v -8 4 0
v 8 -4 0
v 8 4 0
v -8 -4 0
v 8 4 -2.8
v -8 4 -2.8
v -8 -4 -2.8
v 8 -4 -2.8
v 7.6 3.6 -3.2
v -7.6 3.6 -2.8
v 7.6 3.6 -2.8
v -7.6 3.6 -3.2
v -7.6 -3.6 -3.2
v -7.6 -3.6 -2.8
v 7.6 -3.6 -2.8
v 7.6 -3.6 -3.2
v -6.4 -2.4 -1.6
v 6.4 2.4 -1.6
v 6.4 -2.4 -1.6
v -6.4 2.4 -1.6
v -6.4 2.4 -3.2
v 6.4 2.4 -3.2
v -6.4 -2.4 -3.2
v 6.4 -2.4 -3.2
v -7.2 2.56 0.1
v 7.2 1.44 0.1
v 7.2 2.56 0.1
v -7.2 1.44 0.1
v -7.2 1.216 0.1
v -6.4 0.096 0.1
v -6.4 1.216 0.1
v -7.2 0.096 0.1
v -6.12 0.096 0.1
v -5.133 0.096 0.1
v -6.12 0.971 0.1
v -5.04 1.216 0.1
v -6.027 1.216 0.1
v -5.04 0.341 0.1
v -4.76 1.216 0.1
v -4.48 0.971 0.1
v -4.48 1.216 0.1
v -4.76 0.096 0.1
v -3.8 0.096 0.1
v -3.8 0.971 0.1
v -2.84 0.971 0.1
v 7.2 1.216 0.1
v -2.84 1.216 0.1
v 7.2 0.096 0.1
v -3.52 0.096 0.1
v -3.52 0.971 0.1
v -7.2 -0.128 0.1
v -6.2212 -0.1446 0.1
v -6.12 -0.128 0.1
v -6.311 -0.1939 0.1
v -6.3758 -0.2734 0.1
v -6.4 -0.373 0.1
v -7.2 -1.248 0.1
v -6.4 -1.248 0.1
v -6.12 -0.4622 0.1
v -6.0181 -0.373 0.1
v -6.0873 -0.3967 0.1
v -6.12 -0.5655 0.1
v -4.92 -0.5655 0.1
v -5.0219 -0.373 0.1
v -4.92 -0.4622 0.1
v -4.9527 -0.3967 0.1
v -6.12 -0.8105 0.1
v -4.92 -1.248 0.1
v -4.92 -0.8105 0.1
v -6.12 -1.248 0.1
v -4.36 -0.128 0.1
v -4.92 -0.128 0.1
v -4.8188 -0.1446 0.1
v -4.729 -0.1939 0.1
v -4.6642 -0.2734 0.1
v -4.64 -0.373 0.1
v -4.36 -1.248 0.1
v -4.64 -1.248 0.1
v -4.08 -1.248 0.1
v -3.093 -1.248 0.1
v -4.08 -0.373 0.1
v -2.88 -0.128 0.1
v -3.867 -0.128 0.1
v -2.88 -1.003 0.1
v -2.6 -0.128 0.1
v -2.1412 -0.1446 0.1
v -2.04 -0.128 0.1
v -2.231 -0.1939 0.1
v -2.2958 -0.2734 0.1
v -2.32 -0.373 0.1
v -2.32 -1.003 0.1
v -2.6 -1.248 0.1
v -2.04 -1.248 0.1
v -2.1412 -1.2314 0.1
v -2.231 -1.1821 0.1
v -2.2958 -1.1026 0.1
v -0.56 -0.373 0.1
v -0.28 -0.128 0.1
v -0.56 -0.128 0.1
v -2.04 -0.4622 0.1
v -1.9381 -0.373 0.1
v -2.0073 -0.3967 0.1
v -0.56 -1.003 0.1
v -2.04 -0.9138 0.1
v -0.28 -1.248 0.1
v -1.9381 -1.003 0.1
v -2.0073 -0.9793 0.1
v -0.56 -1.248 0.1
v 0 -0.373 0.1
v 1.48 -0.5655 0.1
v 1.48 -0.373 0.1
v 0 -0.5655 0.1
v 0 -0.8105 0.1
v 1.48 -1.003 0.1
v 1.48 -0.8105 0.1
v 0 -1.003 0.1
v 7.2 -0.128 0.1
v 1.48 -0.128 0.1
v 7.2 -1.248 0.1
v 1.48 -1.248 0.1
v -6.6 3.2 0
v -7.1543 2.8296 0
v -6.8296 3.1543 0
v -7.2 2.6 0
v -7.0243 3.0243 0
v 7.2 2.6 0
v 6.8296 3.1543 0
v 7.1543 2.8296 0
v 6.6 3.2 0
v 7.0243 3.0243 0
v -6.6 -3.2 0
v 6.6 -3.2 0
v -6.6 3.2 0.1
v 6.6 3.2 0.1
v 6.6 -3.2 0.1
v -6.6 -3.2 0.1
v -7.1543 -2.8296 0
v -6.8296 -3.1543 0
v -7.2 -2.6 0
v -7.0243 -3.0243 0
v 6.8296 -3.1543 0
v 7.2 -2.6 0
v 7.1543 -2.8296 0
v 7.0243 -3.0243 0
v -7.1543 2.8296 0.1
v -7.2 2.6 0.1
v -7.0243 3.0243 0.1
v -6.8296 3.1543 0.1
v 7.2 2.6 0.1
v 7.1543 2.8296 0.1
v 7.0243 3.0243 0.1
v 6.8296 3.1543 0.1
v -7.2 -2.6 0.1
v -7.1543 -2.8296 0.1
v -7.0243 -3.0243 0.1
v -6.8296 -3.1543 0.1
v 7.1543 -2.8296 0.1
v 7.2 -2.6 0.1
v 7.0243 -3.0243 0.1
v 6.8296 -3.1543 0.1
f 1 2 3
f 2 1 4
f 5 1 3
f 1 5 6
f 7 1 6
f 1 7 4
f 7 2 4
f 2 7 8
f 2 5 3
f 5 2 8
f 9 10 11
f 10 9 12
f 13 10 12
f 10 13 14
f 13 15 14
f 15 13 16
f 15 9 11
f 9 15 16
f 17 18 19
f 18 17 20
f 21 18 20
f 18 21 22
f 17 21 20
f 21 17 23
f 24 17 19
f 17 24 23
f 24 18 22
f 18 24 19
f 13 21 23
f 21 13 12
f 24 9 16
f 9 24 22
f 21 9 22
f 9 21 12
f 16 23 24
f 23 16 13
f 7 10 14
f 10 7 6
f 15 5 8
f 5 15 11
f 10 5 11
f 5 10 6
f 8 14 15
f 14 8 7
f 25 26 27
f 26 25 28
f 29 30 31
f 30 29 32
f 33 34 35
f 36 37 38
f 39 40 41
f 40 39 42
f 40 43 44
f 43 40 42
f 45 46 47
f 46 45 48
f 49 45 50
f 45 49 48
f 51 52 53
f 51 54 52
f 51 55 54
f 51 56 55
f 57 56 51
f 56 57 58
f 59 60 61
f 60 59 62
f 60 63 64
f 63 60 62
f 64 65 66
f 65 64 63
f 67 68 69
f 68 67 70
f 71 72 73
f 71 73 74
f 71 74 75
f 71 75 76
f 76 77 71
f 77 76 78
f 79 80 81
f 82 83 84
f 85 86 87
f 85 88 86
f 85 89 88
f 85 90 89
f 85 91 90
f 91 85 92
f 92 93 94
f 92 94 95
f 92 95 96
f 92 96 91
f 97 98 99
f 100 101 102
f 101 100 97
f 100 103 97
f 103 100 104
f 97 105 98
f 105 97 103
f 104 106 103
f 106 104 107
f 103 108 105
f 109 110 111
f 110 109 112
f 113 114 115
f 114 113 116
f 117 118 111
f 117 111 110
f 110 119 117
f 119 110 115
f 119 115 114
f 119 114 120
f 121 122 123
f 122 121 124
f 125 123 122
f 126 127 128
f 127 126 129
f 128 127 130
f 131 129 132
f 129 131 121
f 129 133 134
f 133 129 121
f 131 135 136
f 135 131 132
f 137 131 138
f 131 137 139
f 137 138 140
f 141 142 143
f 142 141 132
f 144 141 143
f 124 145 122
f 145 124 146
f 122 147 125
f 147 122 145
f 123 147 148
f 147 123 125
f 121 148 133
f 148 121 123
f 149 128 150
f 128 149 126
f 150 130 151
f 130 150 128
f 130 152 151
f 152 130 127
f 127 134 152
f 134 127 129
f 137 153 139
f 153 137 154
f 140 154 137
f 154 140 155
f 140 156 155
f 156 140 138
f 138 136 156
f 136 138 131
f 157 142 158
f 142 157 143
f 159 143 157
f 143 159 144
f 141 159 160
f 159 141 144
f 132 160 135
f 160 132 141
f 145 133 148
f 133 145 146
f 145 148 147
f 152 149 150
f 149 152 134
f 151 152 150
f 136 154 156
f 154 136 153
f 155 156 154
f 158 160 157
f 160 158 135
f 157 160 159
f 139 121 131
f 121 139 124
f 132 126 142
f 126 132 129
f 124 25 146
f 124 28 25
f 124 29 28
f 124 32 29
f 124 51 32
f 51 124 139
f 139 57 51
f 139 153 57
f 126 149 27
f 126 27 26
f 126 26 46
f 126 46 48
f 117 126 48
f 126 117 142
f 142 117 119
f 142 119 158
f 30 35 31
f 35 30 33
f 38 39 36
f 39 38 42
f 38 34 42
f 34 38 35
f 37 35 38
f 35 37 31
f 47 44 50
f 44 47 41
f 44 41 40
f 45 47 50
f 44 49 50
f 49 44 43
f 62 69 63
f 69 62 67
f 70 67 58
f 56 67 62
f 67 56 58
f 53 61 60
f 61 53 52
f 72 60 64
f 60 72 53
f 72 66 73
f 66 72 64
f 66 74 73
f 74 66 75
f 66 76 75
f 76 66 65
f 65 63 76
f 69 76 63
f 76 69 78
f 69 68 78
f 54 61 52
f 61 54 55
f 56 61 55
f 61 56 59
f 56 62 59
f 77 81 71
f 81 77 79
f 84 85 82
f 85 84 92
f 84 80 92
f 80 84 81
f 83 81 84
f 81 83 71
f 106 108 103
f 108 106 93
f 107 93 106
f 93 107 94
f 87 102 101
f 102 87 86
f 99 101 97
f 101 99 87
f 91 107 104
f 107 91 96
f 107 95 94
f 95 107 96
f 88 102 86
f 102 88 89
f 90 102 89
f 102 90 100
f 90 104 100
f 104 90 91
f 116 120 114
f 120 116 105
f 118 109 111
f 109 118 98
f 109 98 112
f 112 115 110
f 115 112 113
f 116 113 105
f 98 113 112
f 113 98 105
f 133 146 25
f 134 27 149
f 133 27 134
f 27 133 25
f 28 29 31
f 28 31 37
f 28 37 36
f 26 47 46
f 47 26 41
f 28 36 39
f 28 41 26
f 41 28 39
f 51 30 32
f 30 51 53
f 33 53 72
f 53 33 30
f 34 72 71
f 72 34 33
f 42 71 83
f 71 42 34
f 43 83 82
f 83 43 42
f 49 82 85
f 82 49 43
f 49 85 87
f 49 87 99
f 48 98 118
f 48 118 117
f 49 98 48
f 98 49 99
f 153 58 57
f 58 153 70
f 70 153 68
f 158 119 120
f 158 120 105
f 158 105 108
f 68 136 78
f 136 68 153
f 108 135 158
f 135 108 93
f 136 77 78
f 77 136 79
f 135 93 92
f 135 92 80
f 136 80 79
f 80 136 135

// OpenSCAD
// file: ../p/box5.scad
use <../lib.scad>
function ldraw_lib__box5() = [
// 0 Box with 5 Faces and All Edges
// 0 Name: box5.dat
// 0 Author: James Jessiman
// 0 !LDRAW_ORG Primitive UPDATE 2012-01
// 0 !LICENSE Licensed under CC BY 4.0 : see CAreadme.txt
// 
// 0 BFC CERTIFY CCW
  [0,"BFC","CERTIFY"],
  [0,"BFC","CCW"],
// 
// 0 !HISTORY 2002-04-03 [sbliss] Modified for BFC compliance
// 0 !HISTORY 2002-04-25 [PTadmin] Official Update 2002-02
// 0 !HISTORY 2007-06-24 [PTadmin] Header formatted for Contributor Agreement
// 0 !HISTORY 2008-07-01 [PTadmin] Official Update 2008-01
// 0 !HISTORY 2012-02-16 [Philo] Changed to CCW
// 0 !HISTORY 2012-03-30 [PTadmin] Official Update 2012-01
// 
// 
// 2 24 1 1 1 -1 1 1
  [2,24,1,1,1,-1,1,1],
// 2 24 -1 1 1 -1 1 -1
  [2,24,-1,1,1,-1,1,-1],
// 2 24 -1 1 -1 1 1 -1
  [2,24,-1,1,-1,1,1,-1],
// 2 24 1 1 -1 1 1 1
  [2,24,1,1,-1,1,1,1],
// 2 24 1 0 1 -1 0 1
  [2,24,1,0,1,-1,0,1],
// 2 24 -1 0 1 -1 0 -1
  [2,24,-1,0,1,-1,0,-1],
// 2 24 -1 0 -1 1 0 -1
  [2,24,-1,0,-1,1,0,-1],
// 2 24 1 0 -1 1 0 1
  [2,24,1,0,-1,1,0,1],
// 2 24 1 0 1 1 1 1
  [2,24,1,0,1,1,1,1],
// 2 24 -1 0 1 -1 1 1
  [2,24,-1,0,1,-1,1,1],
// 2 24 1 0 -1 1 1 -1
  [2,24,1,0,-1,1,1,-1],
// 2 24 -1 0 -1 -1 1 -1
  [2,24,-1,0,-1,-1,1,-1],
// 4 16 -1 1 1 1 1 1 1 1 -1 -1 1 -1
  [4,16,-1,1,1,1,1,1,1,1,-1,-1,1,-1],
// 4 16 -1 1 1 -1 0 1 1 0 1 1 1 1
  [4,16,-1,1,1,-1,0,1,1,0,1,1,1,1],
// 4 16 -1 1 -1 -1 0 -1 -1 0 1 -1 1 1
  [4,16,-1,1,-1,-1,0,-1,-1,0,1,-1,1,1],
// 4 16 1 1 -1 1 0 -1 -1 0 -1 -1 1 -1
  [4,16,1,1,-1,1,0,-1,-1,0,-1,-1,1,-1],
// 4 16 1 1 1 1 0 1 1 0 -1 1 1 -1
  [4,16,1,1,1,1,0,1,1,0,-1,1,1,-1],
];
module ldraw_lib__box5(step=0, col=false, unit=2/5, alt=false, line=0.2, solid=!$preview)
    makepoly(ldraw_lib__box5(), step=step, col=col, unit=unit, alt=alt, line=line, solid=solid);
ldraw_lib__box5(line=0.2);
// file: ../p/box4.scad
use <../lib.scad>
function ldraw_lib__box4() = [
// 0 Box with 4 Faces (2 Parallel Pairs) and All Edges
// 0 Name: box4.dat
// 0 Author: James Jessiman
// 0 !LDRAW_ORG Primitive UPDATE 2012-01
// 0 !LICENSE Licensed under CC BY 4.0 : see CAreadme.txt
// 
// 0 BFC CERTIFY CCW
  [0,"BFC","CERTIFY"],
  [0,"BFC","CCW"],
// 
// 0 !HISTORY 2002-04-03 [sbliss] Modified for BFC compliance
// 0 !HISTORY 2002-04-25 [PTadmin] Official Update 2002-02
// 0 !HISTORY 2007-06-24 [PTadmin] Header formatted for Contributor Agreement
// 0 !HISTORY 2008-07-01 [PTadmin] Official Update 2008-01
// 0 !HISTORY 2012-02-16 [Philo] Changed to CCW
// 0 !HISTORY 2012-03-30 [PTadmin] Official Update 2012-01
// 
// 
// 2 24 1 1 1 -1 1 1
  [2,24,1,1,1,-1,1,1],
// 2 24 -1 1 1 -1 1 -1
  [2,24,-1,1,1,-1,1,-1],
// 2 24 -1 1 -1 1 1 -1
  [2,24,-1,1,-1,1,1,-1],
// 2 24 1 1 -1 1 1 1
  [2,24,1,1,-1,1,1,1],
// 2 24 1 0 1 -1 0 1
  [2,24,1,0,1,-1,0,1],
// 2 24 -1 0 1 -1 0 -1
  [2,24,-1,0,1,-1,0,-1],
// 2 24 -1 0 -1 1 0 -1
  [2,24,-1,0,-1,1,0,-1],
// 2 24 1 0 -1 1 0 1
  [2,24,1,0,-1,1,0,1],
// 2 24 1 0 1 1 1 1
  [2,24,1,0,1,1,1,1],
// 2 24 -1 0 1 -1 1 1
  [2,24,-1,0,1,-1,1,1],
// 2 24 1 0 -1 1 1 -1
  [2,24,1,0,-1,1,1,-1],
// 2 24 -1 0 -1 -1 1 -1
  [2,24,-1,0,-1,-1,1,-1],
// 4 16 -1 1 1 -1 0 1 1 0 1 1 1 1
  [4,16,-1,1,1,-1,0,1,1,0,1,1,1,1],
// 4 16 -1 1 -1 -1 0 -1 -1 0 1 -1 1 1
  [4,16,-1,1,-1,-1,0,-1,-1,0,1,-1,1,1],
// 4 16 1 1 -1 1 0 -1 -1 0 -1 -1 1 -1
  [4,16,1,1,-1,1,0,-1,-1,0,-1,-1,1,-1],
// 4 16 1 1 1 1 0 1 1 0 -1 1 1 -1
  [4,16,1,1,1,1,0,1,1,0,-1,1,1,-1],
];
module ldraw_lib__box4(step=0, col=false, unit=2/5, alt=false, line=0.2, solid=!$preview)
    makepoly(ldraw_lib__box4(), step=step, col=col, unit=unit, alt=alt, line=line, solid=solid);
ldraw_lib__box4(line=0.2);
// file: s/6148328bds02.scad
use <../../lib.scad>
function ldraw_lib__s__6148328bds02() = [
// 0 ~Sticker  0.8 x  1.8 with Black "NT ANCE" on Black Halftone Stripes on White Background - Third Stripe Background
// 0 Name: s\6148328bds02.dat
// 0 Author: Massimo Maso [Sirio]
// 0 !LDRAW_ORG Subpart UPDATE 2024-08
// 0 !LICENSE Licensed under CC BY 4.0 : see CAreadme.txt
// 
// 0 BFC CERTIFY CCW
  [0,"BFC","CERTIFY"],
  [0,"BFC","CCW"],
// 
// 0 !HISTORY 2024-09-30 [OrionP] Official Update 2024-08
// 
// 
// 0 // Top faces
// 3 16 -18 0 -.32 -15.5529 0 -.3614 -15.3 0 -.32
  [3,16,-18,0,-.32,-15.5529,0,-.3614,-15.3,0,-.32],
// 3 16 -18 0 -.32 -15.7776 0 -.4847 -15.5529 0 -.3614
  [3,16,-18,0,-.32,-15.7776,0,-.4847,-15.5529,0,-.3614],
// 3 16 -18 0 -.32 -15.9395 0 -.6834 -15.7776 0 -.4847
  [3,16,-18,0,-.32,-15.9395,0,-.6834,-15.7776,0,-.4847],
// 3 16 -18 0 -.32 -16 0 -.9325 -15.9395 0 -.6834
  [3,16,-18,0,-.32,-16,0,-.9325,-15.9395,0,-.6834],
// 4 16 -18 0 -.32 -18 0 -3.12 -16 0 -3.12 -16 0 -.9325
  [4,16,-18,0,-.32,-18,0,-3.12,-16,0,-3.12,-16,0,-.9325],
// 4 16 -15.3 0 -1.4138 -15.0452 0 -.9325 -15.2182 0 -.9918 -15.3 0 -1.1555
  [4,16,-15.3,0,-1.4138,-15.0452,0,-.9325,-15.2182,0,-.9918,-15.3,0,-1.1555],
// 4 16 -15.3 0 -1.4138 -12.3 0 -1.4138 -12.5548 0 -.9325 -15.0452 0 -.9325
  [4,16,-15.3,0,-1.4138,-12.3,0,-1.4138,-12.5548,0,-.9325,-15.0452,0,-.9325],
// 4 16 -12.3 0 -1.4138 -12.3 0 -1.1555 -12.3817 0 -.9918 -12.5548 0 -.9325
  [4,16,-12.3,0,-1.4138,-12.3,0,-1.1555,-12.3817,0,-.9918,-12.5548,0,-.9325],
// 4 16 -15.3 0 -2.0263 -15.3 0 -3.12 -12.3 0 -3.12 -12.3 0 -2.0263
  [4,16,-15.3,0,-2.0263,-15.3,0,-3.12,-12.3,0,-3.12,-12.3,0,-2.0263],
// 3 16 -10.9 0 -.32 -12.3 0 -.32 -12.0471 0 -.3614
  [3,16,-10.9,0,-.32,-12.3,0,-.32,-12.0471,0,-.3614],
// 3 16 -10.9 0 -.32 -12.0471 0 -.3614 -11.8224 0 -.4847
  [3,16,-10.9,0,-.32,-12.0471,0,-.3614,-11.8224,0,-.4847],
// 3 16 -10.9 0 -.32 -11.8224 0 -.4847 -11.6605 0 -.6834
  [3,16,-10.9,0,-.32,-11.8224,0,-.4847,-11.6605,0,-.6834],
// 3 16 -10.9 0 -.32 -11.6605 0 -.6834 -11.6 0 -.9325
  [3,16,-10.9,0,-.32,-11.6605,0,-.6834,-11.6,0,-.9325],
// 4 16 -10.9 0 -.32 -11.6 0 -.9325 -11.6 0 -3.12 -10.9 0 -3.12
  [4,16,-10.9,0,-.32,-11.6,0,-.9325,-11.6,0,-3.12,-10.9,0,-3.12],
// 3 16 -10.2 0 -3.12 -7.7324 0 -3.12 -10.2 0 -.9325
  [3,16,-10.2,0,-3.12,-7.7324,0,-3.12,-10.2,0,-.9325],
// 3 16 -7.2 0 -.32 -9.6676 0 -.32 -7.2 0 -2.5075
  [3,16,-7.2,0,-.32,-9.6676,0,-.32,-7.2,0,-2.5075],
// 3 16 -6.5 0 -.32 -5.3529 0 -.3614 -5.1 0 -.32
  [3,16,-6.5,0,-.32,-5.3529,0,-.3614,-5.1,0,-.32],
// 3 16 -6.5 0 -.32 -5.5776 0 -.4847 -5.3529 0 -.3614
  [3,16,-6.5,0,-.32,-5.5776,0,-.4847,-5.3529,0,-.3614],
// 3 16 -6.5 0 -.32 -5.7395 0 -.6834 -5.5776 0 -.4847
  [3,16,-6.5,0,-.32,-5.7395,0,-.6834,-5.5776,0,-.4847],
// 3 16 -6.5 0 -.32 -5.8 0 -.9325 -5.7395 0 -.6834
  [3,16,-6.5,0,-.32,-5.8,0,-.9325,-5.7395,0,-.6834],
// 4 16 -6.5 0 -.32 -6.5 0 -3.12 -5.8 0 -2.5075 -5.8 0 -.9325
  [4,16,-6.5,0,-.32,-6.5,0,-3.12,-5.8,0,-2.5075,-5.8,0,-.9325],
// 3 16 -6.5 0 -3.12 -5.1 0 -3.12 -5.3529 0 -3.0786
  [3,16,-6.5,0,-3.12,-5.1,0,-3.12,-5.3529,0,-3.0786],
// 3 16 -6.5 0 -3.12 -5.3529 0 -3.0786 -5.5776 0 -2.9553
  [3,16,-6.5,0,-3.12,-5.3529,0,-3.0786,-5.5776,0,-2.9553],
// 3 16 -6.5 0 -3.12 -5.5776 0 -2.9553 -5.7395 0 -2.7566
  [3,16,-6.5,0,-3.12,-5.5776,0,-2.9553,-5.7395,0,-2.7566],
// 3 16 -6.5 0 -3.12 -5.7395 0 -2.7566 -5.8 0 -2.5075
  [3,16,-6.5,0,-3.12,-5.7395,0,-2.7566,-5.8,0,-2.5075],
// 3 16 -1.4 0 -.9325 -.7 0 -.32 -1.4 0 -.32
  [3,16,-1.4,0,-.9325,-.7,0,-.32,-1.4,0,-.32],
// 4 16 -1.4 0 -.9325 -4.8452 0 -.9325 -5.0182 0 -.9918 -5.1 0 -1.1555
  [4,16,-1.4,0,-.9325,-4.8452,0,-.9325,-5.0182,0,-.9918,-5.1,0,-1.1555],
// 4 16 -1.4 0 -.9325 -5.1 0 -1.1555 -5.1 0 -2.2846 -1.4 0 -2.5075
  [4,16,-1.4,0,-.9325,-5.1,0,-1.1555,-5.1,0,-2.2846,-1.4,0,-2.5075],
// 4 16 -1.4 0 -.9325 -1.4 0 -2.5075 -.7 0 -3.12 -.7 0 -.32
  [4,16,-1.4,0,-.9325,-1.4,0,-2.5075,-.7,0,-3.12,-.7,0,-.32],
// 4 16 -1.4 0 -2.5075 -5.1 0 -2.2846 -5.0182 0 -2.4482 -4.8452 0 -2.5075
  [4,16,-1.4,0,-2.5075,-5.1,0,-2.2846,-5.0182,0,-2.4482,-4.8452,0,-2.5075],
// 3 16 -1.4 0 -2.5075 -1.4 0 -3.12 -.7 0 -3.12
  [3,16,-1.4,0,-2.5075,-1.4,0,-3.12,-.7,0,-3.12],
// 4 16 0 0 -.9325 0 0 -1.4138 3.7 0 -1.4138 3.7 0 -.9325
  [4,16,0,0,-.9325,0,0,-1.4138,3.7,0,-1.4138,3.7,0,-.9325],
// 4 16 0 0 -2.0263 0 0 -2.5075 3.7 0 -2.5075 3.7 0 -2.0263
  [4,16,0,0,-2.0263,0,0,-2.5075,3.7,0,-2.5075,3.7,0,-2.0263],
// 3 16 18 0 -.32 3.7 0 -.32 3.7 0 -.9325
  [3,16,18,0,-.32,3.7,0,-.32,3.7,0,-.9325],
// 3 16 18 0 -.32 3.7 0 -.9325 3.7 0 -1.4138
  [3,16,18,0,-.32,3.7,0,-.9325,3.7,0,-1.4138],
// 4 16 18 0 -.32 3.7 0 -1.4138 3.7 0 -2.0263 18 0 -3.12
  [4,16,18,0,-.32,3.7,0,-1.4138,3.7,0,-2.0263,18,0,-3.12],
// 3 16 18 0 -3.12 3.7 0 -2.0263 3.7 0 -2.5075
  [3,16,18,0,-3.12,3.7,0,-2.0263,3.7,0,-2.5075],
// 3 16 18 0 -3.12 3.7 0 -2.5075 3.7 0 -3.12
  [3,16,18,0,-3.12,3.7,0,-2.5075,3.7,0,-3.12],
];
module ldraw_lib__s__6148328bds02(step=0, col=false, unit=2/5, alt=false, line=0.2, solid=!$preview)
    makepoly(ldraw_lib__s__6148328bds02(), step=step, col=col, unit=unit, alt=alt, line=line, solid=solid);
ldraw_lib__s__6148328bds02(line=0.2);
// file: s/6148328bds01.scad
use <../../lib.scad>
function ldraw_lib__s__6148328bds01() = [
// 0 ~Sticker  0.8 x  1.8 with Black "NT ANCE" on Black Halftone Stripes on White Background - Second Stripe Background
// 0 Name: s\6148328bds01.dat
// 0 Author: Massimo Maso [Sirio]
// 0 !LDRAW_ORG Subpart UPDATE 2024-08
// 0 !LICENSE Licensed under CC BY 4.0 : see CAreadme.txt
// 
// 0 BFC CERTIFY CCW
  [0,"BFC","CERTIFY"],
  [0,"BFC","CCW"],
// 
// 0 !HISTORY 2024-09-30 [OrionP] Official Update 2024-08
// 
// 
// 0 // Top faces
// 4 16 -18 0 3.04 -18 0 .24 -16 0 .24 -16 0 3.04
  [4,16,-18,0,3.04,-18,0,.24,-16,0,.24,-16,0,3.04],
// 3 16 -15.3 0 .24 -12.8324 0 .24 -15.3 0 2.4275
  [3,16,-15.3,0,.24,-12.8324,0,.24,-15.3,0,2.4275],
// 3 16 -12.6 0 3.04 -15.0676 0 3.04 -12.6 0 .8525
  [3,16,-12.6,0,3.04,-15.0676,0,3.04,-12.6,0,.8525],
// 4 16 -11.2 0 2.4275 -11.2 0 3.04 -11.9 0 3.04 -11.9 0 .24
  [4,16,-11.2,0,2.4275,-11.2,0,3.04,-11.9,0,3.04,-11.9,0,.24],
// 4 16 -11.2 0 2.4275 -11.9 0 .24 -9.5 0 .24 -9.5 0 2.4275
  [4,16,-11.2,0,2.4275,-11.9,0,.24,-9.5,0,.24,-9.5,0,2.4275],
// 4 16 -7.1 0 2.4275 18 0 .24 18 0 3.04 -7.1 0 3.04
  [4,16,-7.1,0,2.4275,18,0,.24,18,0,3.04,-7.1,0,3.04],
// 4 16 -7.1 0 2.4275 -8.8 0 2.4275 -8.8 0 .24 18 0 .24
  [4,16,-7.1,0,2.4275,-8.8,0,2.4275,-8.8,0,.24,18,0,.24],
];
module ldraw_lib__s__6148328bds01(step=0, col=false, unit=2/5, alt=false, line=0.2, solid=!$preview)
    makepoly(ldraw_lib__s__6148328bds01(), step=step, col=col, unit=unit, alt=alt, line=line, solid=solid);
ldraw_lib__s__6148328bds01(line=0.2);
// file: ../p/box3u12.scad
use <../lib.scad>
function ldraw_lib__box3u12() = [
// 0 Box with 3 Parallel Faces without Any Edges
// 0 Name: box3u12.dat
// 0 Author: J.C. Tchang [tchang]
// 0 !LDRAW_ORG Primitive UPDATE 2014-02
// 0 !LICENSE Licensed under CC BY 4.0 : see CAreadme.txt
// 
// 0 BFC CERTIFY CCW
  [0,"BFC","CERTIFY"],
  [0,"BFC","CCW"],
// 
// 0 !HISTORY 2014-12-23 [PTadmin] Official Update 2014-02
// 
// 
// 4 16 -1 1 1 1 1 1 1 1 -1 -1 1 -1
  [4,16,-1,1,1,1,1,1,1,1,-1,-1,1,-1],
// 4 16 -1 1 1 -1 0 1 1 0 1 1 1 1
  [4,16,-1,1,1,-1,0,1,1,0,1,1,1,1],
// 4 16 1 1 -1 1 0 -1 -1 0 -1 -1 1 -1
  [4,16,1,1,-1,1,0,-1,-1,0,-1,-1,1,-1],
];
module ldraw_lib__box3u12(step=0, col=false, unit=2/5, alt=false, line=0.2, solid=!$preview)
    makepoly(ldraw_lib__box3u12(), step=step, col=col, unit=unit, alt=alt, line=line, solid=solid);
ldraw_lib__box3u12(line=0.2);
// file: ../p/1-4cyli.scad
use <../lib.scad>
function ldraw_lib__1_4cyli() = [
// 0 Cylinder 0.25
// 0 Name: 1-4cyli.dat
// 0 Author: James Jessiman
// 0 !LDRAW_ORG Primitive UPDATE 2012-01
// 0 !LICENSE Licensed under CC BY 4.0 : see CAreadme.txt
// 
// 0 BFC CERTIFY CCW
  [0,"BFC","CERTIFY"],
  [0,"BFC","CCW"],
// 
// 0 !HISTORY 2002-03-23 [sbliss] Added BFC statement.
// 0 !HISTORY 2002-04-25 [PTadmin] Official Update 2002-02
// 0 !HISTORY 2007-06-22 [PTadmin] Header formatted for Contributor Agreement
// 0 !HISTORY 2008-07-01 [PTadmin] Official Update 2008-01
// 0 !HISTORY 2012-02-16 [Philo] Changed to CCW
// 0 !HISTORY 2012-03-30 [PTadmin] Official Update 2012-01
// 
// 
// 4 16 1 1 0 0.9239 1 0.3827 0.9239 0 0.3827 1 0 0
  [4,16,1,1,0,0.9239,1,0.3827,0.9239,0,0.3827,1,0,0],
// 5 24 1 0 0 1 1 0 0.9239 0 0.3827 1 0 -1
  [5,24,1,0,0,1,1,0,0.9239,0,0.3827,1,0,-1],
// 4 16 0.9239 1 0.3827 0.7071 1 0.7071 0.7071 0 0.7071 0.9239 0 0.3827
  [4,16,0.9239,1,0.3827,0.7071,1,0.7071,0.7071,0,0.7071,0.9239,0,0.3827],
// 5 24 0.9239 0 0.3827 0.9239 1 0.3827 0.7071 0 0.7071 1 0 0
  [5,24,0.9239,0,0.3827,0.9239,1,0.3827,0.7071,0,0.7071,1,0,0],
// 4 16 0.7071 1 0.7071 0.3827 1 0.9239 0.3827 0 0.9239 0.7071 0 0.7071
  [4,16,0.7071,1,0.7071,0.3827,1,0.9239,0.3827,0,0.9239,0.7071,0,0.7071],
// 5 24 0.7071 0 0.7071 0.7071 1 0.7071 0.3827 0 0.9239 0.9239 0 0.3827
  [5,24,0.7071,0,0.7071,0.7071,1,0.7071,0.3827,0,0.9239,0.9239,0,0.3827],
// 4 16 0.3827 1 0.9239 0 1 1 0 0 1 0.3827 0 0.9239
  [4,16,0.3827,1,0.9239,0,1,1,0,0,1,0.3827,0,0.9239],
// 5 24 0.3827 0 0.9239 0.3827 1 0.9239 0 0 1 0.7071 0 0.7071
  [5,24,0.3827,0,0.9239,0.3827,1,0.9239,0,0,1,0.7071,0,0.7071],
// 5 24 0 0 1 0 1 1 0.3827 0 0.9239 -1 0 1
  [5,24,0,0,1,0,1,1,0.3827,0,0.9239,-1,0,1],
];
module ldraw_lib__1_4cyli(step=0, col=false, unit=2/5, alt=false, line=0.2, solid=!$preview)
    makepoly(ldraw_lib__1_4cyli(), step=step, col=col, unit=unit, alt=alt, line=line, solid=solid);
ldraw_lib__1_4cyli(line=0.2);
// file: ../p/1-4chrd.scad
use <../lib.scad>
function ldraw_lib__1_4chrd() = [
// 0 Chord 0.25
// 0 Name: 1-4chrd.dat
// 0 Author: Max Martin Richter [MMR1988]
// 0 !LDRAW_ORG Primitive UPDATE 2023-05
// 0 !LICENSE Licensed under CC BY 4.0 : see CAreadme.txt
// 
// 0 BFC CERTIFY CCW
  [0,"BFC","CERTIFY"],
  [0,"BFC","CCW"],
// 
// 0 !HISTORY 2004-04-22 [PTadmin] Official Update 2004-02
// 0 !HISTORY 2007-10-09 [PTadmin] Header formatted for Contributor Agreement
// 0 !HISTORY 2008-07-01 [PTadmin] Official Update 2008-01
// 0 !HISTORY 2012-08-02 [MMR1988] Re-creation with PrimGen2 and Rectifier
// 0 !HISTORY 2012-08-09 [PTadmin] Official Update 2012-02
// 0 !HISTORY 2023-10-27 [OrionP] Change author to MMR1988 from hafhead
// 0 !HISTORY 2023-10-31 [OrionP] Official Update 2023-05
// 
// 4 16 0.9239 0 0.3827 0.3827 0 0.9239 0 0 1 1 0 0
  [4,16,0.9239,0,0.3827,0.3827,0,0.9239,0,0,1,1,0,0],
// 3 16 0.7071 0 0.7071 0.3827 0 0.9239 0.9239 0 0.3827
  [3,16,0.7071,0,0.7071,0.3827,0,0.9239,0.9239,0,0.3827],
];
module ldraw_lib__1_4chrd(step=0, col=false, unit=2/5, alt=false, line=0.2, solid=!$preview)
    makepoly(ldraw_lib__1_4chrd(), step=step, col=col, unit=unit, alt=alt, line=line, solid=solid);
ldraw_lib__1_4chrd(line=0.2);
// file: s/3069bs01.scad
use <../../lib.scad>
use <../../p/box4.scad>
use <../../p/box5.scad>
function ldraw_lib__s__3069bs01() = [
// 0 ~Tile  1 x  2 with Groove without Top Face
// 0 Name: s\3069bs01.dat
// 0 Author: Santeri Piippo [arezey]
// 0 !LDRAW_ORG Subpart UPDATE 2010-02
// 0 !LICENSE Licensed under CC BY 4.0 : see CAreadme.txt
// 
// 0 BFC CERTIFY CCW
  [0,"BFC","CERTIFY"],
  [0,"BFC","CCW"],
// 
// 0 !HISTORY 2010-07-05 [PTadmin] Official Update 2010-02
// 
// 
// 1 16 0 0 0 20 0 0 0 7 0 0 0 10 box4.dat
  [1,16,0,0,0,20,0,0,0,7,0,0,0,10, ldraw_lib__box4()],
// 1 16 0 7 0 19 0 0 0 1 0 0 0 9 box4.dat
  [1,16,0,7,0,19,0,0,0,1,0,0,0,9, ldraw_lib__box4()],
// 0 BFC INVERTNEXT
  [0,"BFC","INVERTNEXT"],
// 1 16 0 8 0 16 0 0 0 -4 0 0 0 6 box5.dat
  [1,16,0,8,0,16,0,0,0,-4,0,0,0,6, ldraw_lib__box5()],
// 4 16 -19 8 9 -16 8 6 -16 8 -6 -19 8 -9
  [4,16,-19,8,9,-16,8,6,-16,8,-6,-19,8,-9],
// 4 16 19 8 -9 16 8 -6 16 8 6 19 8 9
  [4,16,19,8,-9,16,8,-6,16,8,6,19,8,9],
// 4 16 19 8 9 16 8 6 -16 8 6 -19 8 9
  [4,16,19,8,9,16,8,6,-16,8,6,-19,8,9],
// 4 16 -19 8 -9 -16 8 -6 16 8 -6 19 8 -9
  [4,16,-19,8,-9,-16,8,-6,16,8,-6,19,8,-9],
// 4 16 -20 7 10 -19 7 9 -19 7 -9 -20 7 -10
  [4,16,-20,7,10,-19,7,9,-19,7,-9,-20,7,-10],
// 4 16 20 7 -10 19 7 -9 19 7 9 20 7 10
  [4,16,20,7,-10,19,7,-9,19,7,9,20,7,10],
// 4 16 20 7 10 19 7 9 -19 7 9 -20 7 10
  [4,16,20,7,10,19,7,9,-19,7,9,-20,7,10],
// 4 16 -20 7 -10 -19 7 -9 19 7 -9 20 7 -10
  [4,16,-20,7,-10,-19,7,-9,19,7,-9,20,7,-10],
// 0 //
];
module ldraw_lib__s__3069bs01(step=0, col=false, unit=2/5, alt=false, line=0.2, solid=!$preview)
    makepoly(ldraw_lib__s__3069bs01(), step=step, col=col, unit=unit, alt=alt, line=line, solid=solid);
ldraw_lib__s__3069bs01(line=0.2);
// file: 3069b.scad
use <../lib.scad>
use <s/3069bs01.scad>
function ldraw_lib__3069b() = [
// 0 Tile  1 x  2 with Groove
// 0 Name: 3069b.dat
// 0 Author: Santeri Piippo [arezey]
// 0 !LDRAW_ORG Part UPDATE 2010-02
// 0 !LICENSE Licensed under CC BY 4.0 : see CAreadme.txt
// 
// 0 BFC CERTIFY CCW
  [0,"BFC","CERTIFY"],
  [0,"BFC","CCW"],
// 
// 0 !KEYWORDS BrickLink 3069
// 
// 0 !HISTORY 2010-07-05 [PTadmin] Official Update 2010-02
// 
// 
// 4 16 20 0 -10 20 0 10 -20 0 10 -20 0 -10
  [4,16,20,0,-10,20,0,10,-20,0,10,-20,0,-10],
// 1 16 0 0 0 1 0 0 0 1 0 0 0 1 s\3069bs01.dat
  [1,16,0,0,0,1,0,0,0,1,0,0,0,1, ldraw_lib__s__3069bs01()],
// 0 //
];
module ldraw_lib__3069b(step=0, col=false, unit=2/5, alt=false, line=0.2, solid=!$preview)
    makepoly(ldraw_lib__3069b(), step=step, col=col, unit=unit, alt=alt, line=line, solid=solid);
ldraw_lib__3069b(line=0.2);
// main file
use <../lib.scad>
use <3069b.scad>
use <6148328bd.scad>
function ldraw_lib__3069bd2a() = [
// 0 Tile  1 x  2 with Black "NT ANCE" on Black Halftone Stripes on White Background Sticker
// 0 Name: 3069bd2a.dat
// 0 Author: Vincent Messenet [Cheenzo]
// 0 !LDRAW_ORG Shortcut UPDATE 2026-05
// 0 !LICENSE Licensed under CC BY 4.0 : see CAreadme.txt
// 
// 0 BFC CERTIFY CCW
  [0,"BFC","CERTIFY"],
  [0,"BFC","CCW"],
// 
// 0 !CATEGORY Sticker Shortcut
// 
// 0 !KEYWORDS Bricklink 3069pb0684L, Porsche 919 Hybrid and 917K Pit Lane
// 0 !KEYWORDS set 75876, Speed Champions
// 
// 0 !HISTORY 2026-05-31 [OrionP] Official Update 2026-05
// 
// 1 16 0 0 0 1 0 0 0 1 0 0 0 1 3069b.dat
  [1,16,0,0,0,1,0,0,0,1,0,0,0,1, ldraw_lib__3069b()],
// 1 16 0 0 0 1 0 0 0 1 0 0 0 1 6148328bd.dat
  [1,16,0,0,0,1,0,0,0,1,0,0,0,1, ldraw_lib__6148328bd()],
];
module ldraw_lib__3069bd2a(step=0, col=false, unit=2/5, alt=false, line=0.2, solid=!$preview)
    makepoly(ldraw_lib__3069bd2a(), step=step, col=col, unit=unit, alt=alt, line=line, solid=solid);
ldraw_lib__3069bd2a(line=0.2);
